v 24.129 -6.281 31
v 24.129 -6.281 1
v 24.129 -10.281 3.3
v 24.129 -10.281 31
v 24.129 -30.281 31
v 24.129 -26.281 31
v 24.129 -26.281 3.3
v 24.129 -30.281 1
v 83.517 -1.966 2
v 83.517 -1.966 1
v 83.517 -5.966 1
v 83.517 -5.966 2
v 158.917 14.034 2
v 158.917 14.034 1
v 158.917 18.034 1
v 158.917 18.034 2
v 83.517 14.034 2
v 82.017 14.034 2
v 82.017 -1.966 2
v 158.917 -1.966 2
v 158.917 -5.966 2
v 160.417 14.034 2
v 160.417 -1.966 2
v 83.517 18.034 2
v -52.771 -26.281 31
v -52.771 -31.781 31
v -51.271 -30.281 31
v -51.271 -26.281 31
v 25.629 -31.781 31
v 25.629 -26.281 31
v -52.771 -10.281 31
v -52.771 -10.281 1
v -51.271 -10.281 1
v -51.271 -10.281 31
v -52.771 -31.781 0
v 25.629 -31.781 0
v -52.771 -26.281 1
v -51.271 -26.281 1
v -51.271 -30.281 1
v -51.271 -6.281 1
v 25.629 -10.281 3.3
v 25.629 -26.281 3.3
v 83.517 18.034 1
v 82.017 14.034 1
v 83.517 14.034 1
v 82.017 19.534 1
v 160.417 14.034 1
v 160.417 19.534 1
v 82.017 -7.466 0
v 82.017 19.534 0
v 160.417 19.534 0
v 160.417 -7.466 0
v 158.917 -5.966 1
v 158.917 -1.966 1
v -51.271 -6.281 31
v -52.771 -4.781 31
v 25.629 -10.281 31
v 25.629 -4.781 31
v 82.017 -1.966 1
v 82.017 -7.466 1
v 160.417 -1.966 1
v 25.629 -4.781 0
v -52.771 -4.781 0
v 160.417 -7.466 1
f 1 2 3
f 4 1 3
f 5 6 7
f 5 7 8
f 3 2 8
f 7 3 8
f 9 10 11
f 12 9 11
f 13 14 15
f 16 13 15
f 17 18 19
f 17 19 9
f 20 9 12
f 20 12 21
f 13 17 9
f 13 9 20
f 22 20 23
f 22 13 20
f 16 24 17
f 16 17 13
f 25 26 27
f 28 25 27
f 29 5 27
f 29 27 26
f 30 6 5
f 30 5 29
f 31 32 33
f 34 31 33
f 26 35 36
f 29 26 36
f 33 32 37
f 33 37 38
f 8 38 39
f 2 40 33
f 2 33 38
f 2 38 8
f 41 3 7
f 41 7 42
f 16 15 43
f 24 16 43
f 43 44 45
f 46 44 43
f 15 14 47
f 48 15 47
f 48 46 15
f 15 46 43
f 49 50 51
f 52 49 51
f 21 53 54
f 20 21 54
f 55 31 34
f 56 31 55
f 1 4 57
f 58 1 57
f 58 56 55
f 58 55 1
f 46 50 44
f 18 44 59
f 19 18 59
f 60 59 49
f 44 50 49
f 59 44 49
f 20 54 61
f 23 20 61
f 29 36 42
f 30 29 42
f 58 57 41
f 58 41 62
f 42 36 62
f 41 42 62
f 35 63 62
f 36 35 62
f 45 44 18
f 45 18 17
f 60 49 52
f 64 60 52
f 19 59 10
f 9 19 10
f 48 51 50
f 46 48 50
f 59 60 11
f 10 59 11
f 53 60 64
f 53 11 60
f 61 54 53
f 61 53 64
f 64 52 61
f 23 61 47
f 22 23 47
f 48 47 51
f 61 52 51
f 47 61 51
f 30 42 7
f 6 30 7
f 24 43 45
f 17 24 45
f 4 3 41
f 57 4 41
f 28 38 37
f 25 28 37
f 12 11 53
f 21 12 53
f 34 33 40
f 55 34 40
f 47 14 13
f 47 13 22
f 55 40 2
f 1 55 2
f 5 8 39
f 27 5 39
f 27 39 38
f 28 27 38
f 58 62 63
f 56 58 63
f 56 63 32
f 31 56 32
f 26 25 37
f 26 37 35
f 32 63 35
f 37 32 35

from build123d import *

# Parameters (mm, degrees)
F0_W     = 1.5
F0_H     = 16
F1_DEPTH = 1
F2_DEPTH = 31
F3_DEPTH = 3.3
F4_DEPTH = 1
F5_DEPTH = 2


with BuildPart() as f1:
    # F0 (on Top) → F1 (new body)
    with BuildSketch(Plane.XY):
        Polygon((-51.271316, -30.281004), (-51.271316, -26.281004), (-52.771316, -26.281004), (-52.771316, -31.781004), (25.628684, -31.781004), (25.628684, -26.281004), (24.128684, -26.281004), (24.128684, -30.281004), align=None)
        Polygon((-51.271316, -10.281004), (-51.271316, -6.281004), (24.128684, -6.281004), (24.128684, -10.281004), (25.628684, -10.281004), (25.628684, -4.781004), (-52.771316, -4.781004), (-52.771316, -10.281004), align=None)
        Polygon((24.128684, -6.281004), (-51.271316, -6.281004), (-51.271316, -10.281004), (-51.271316, -26.281004), (-51.271316, -30.281004), (24.128684, -30.281004), (24.128684, -26.281004), (24.128684, -10.281004), align=None)
        with Locations((-52.021316, -18.281004)):
            Rectangle(F0_W, F0_H)
        with Locations((24.878684, -18.281004)):
            Rectangle(F0_W, F0_H)
    extrude(amount=F1_DEPTH)

    # F0 (on Top) → F2 (join)
    with BuildSketch(Plane.XY):
        Polygon((-51.271316, -10.281004), (-51.271316, -6.281004), (24.128684, -6.281004), (24.128684, -10.281004), (25.628684, -10.281004), (25.628684, -4.781004), (-52.771316, -4.781004), (-52.771316, -10.281004), align=None)
        Polygon((-51.271316, -30.281004), (-51.271316, -26.281004), (-52.771316, -26.281004), (-52.771316, -31.781004), (25.628684, -31.781004), (25.628684, -26.281004), (24.128684, -26.281004), (24.128684, -30.281004), align=None)
    extrude(amount=F2_DEPTH)

    # F0 (on Top) → F3 (join)
    with BuildSketch(Plane.XY):
        with Locations((24.878684, -18.281004)):
            Rectangle(F0_W, F0_H)
    extrude(amount=F3_DEPTH)


with BuildPart() as f4:
    # F0 (on Top) → F4 (new body)
    with BuildSketch(Plane.XY):
        Polygon((158.917236, 18.033927), (83.517236, 18.033927), (83.517236, 14.033927), (83.517236, -1.966073), (83.517236, -5.966073), (158.917236, -5.966073), (158.917236, -1.966073), (158.917236, 14.033927), align=None)
        Polygon((83.517236, 14.033927), (83.517236, 18.033927), (158.917236, 18.033927), (158.917236, 14.033927), (160.417236, 14.033927), (160.417236, 19.533927), (82.017236, 19.533927), (82.017236, 14.033927), align=None)
        with Locations((82.767236, 6.033927)):
            Rectangle(F0_W, F0_H)
        Polygon((83.517236, -5.966073), (83.517236, -1.966073), (82.017236, -1.966073), (82.017236, -7.466073), (160.417236, -7.466073), (160.417236, -1.966073), (158.917236, -1.966073), (158.917236, -5.966073), align=None)
        with Locations((159.667236, 6.033927)):
            Rectangle(F0_W, F0_H)
    extrude(amount=F4_DEPTH)

    # F0 (on Top) → F5 (join)
    with BuildSketch(Plane.XY):
        Polygon((158.917236, 18.033927), (83.517236, 18.033927), (83.517236, 14.033927), (83.517236, -1.966073), (83.517236, -5.966073), (158.917236, -5.966073), (158.917236, -1.966073), (158.917236, 14.033927), align=None)
        with Locations((82.767236, 6.033927)):
            Rectangle(F0_W, F0_H)
        with Locations((159.667236, 6.033927)):
            Rectangle(F0_W, F0_H)
    extrude(amount=F5_DEPTH)


solid = Compound([f1.part, f4.part])
